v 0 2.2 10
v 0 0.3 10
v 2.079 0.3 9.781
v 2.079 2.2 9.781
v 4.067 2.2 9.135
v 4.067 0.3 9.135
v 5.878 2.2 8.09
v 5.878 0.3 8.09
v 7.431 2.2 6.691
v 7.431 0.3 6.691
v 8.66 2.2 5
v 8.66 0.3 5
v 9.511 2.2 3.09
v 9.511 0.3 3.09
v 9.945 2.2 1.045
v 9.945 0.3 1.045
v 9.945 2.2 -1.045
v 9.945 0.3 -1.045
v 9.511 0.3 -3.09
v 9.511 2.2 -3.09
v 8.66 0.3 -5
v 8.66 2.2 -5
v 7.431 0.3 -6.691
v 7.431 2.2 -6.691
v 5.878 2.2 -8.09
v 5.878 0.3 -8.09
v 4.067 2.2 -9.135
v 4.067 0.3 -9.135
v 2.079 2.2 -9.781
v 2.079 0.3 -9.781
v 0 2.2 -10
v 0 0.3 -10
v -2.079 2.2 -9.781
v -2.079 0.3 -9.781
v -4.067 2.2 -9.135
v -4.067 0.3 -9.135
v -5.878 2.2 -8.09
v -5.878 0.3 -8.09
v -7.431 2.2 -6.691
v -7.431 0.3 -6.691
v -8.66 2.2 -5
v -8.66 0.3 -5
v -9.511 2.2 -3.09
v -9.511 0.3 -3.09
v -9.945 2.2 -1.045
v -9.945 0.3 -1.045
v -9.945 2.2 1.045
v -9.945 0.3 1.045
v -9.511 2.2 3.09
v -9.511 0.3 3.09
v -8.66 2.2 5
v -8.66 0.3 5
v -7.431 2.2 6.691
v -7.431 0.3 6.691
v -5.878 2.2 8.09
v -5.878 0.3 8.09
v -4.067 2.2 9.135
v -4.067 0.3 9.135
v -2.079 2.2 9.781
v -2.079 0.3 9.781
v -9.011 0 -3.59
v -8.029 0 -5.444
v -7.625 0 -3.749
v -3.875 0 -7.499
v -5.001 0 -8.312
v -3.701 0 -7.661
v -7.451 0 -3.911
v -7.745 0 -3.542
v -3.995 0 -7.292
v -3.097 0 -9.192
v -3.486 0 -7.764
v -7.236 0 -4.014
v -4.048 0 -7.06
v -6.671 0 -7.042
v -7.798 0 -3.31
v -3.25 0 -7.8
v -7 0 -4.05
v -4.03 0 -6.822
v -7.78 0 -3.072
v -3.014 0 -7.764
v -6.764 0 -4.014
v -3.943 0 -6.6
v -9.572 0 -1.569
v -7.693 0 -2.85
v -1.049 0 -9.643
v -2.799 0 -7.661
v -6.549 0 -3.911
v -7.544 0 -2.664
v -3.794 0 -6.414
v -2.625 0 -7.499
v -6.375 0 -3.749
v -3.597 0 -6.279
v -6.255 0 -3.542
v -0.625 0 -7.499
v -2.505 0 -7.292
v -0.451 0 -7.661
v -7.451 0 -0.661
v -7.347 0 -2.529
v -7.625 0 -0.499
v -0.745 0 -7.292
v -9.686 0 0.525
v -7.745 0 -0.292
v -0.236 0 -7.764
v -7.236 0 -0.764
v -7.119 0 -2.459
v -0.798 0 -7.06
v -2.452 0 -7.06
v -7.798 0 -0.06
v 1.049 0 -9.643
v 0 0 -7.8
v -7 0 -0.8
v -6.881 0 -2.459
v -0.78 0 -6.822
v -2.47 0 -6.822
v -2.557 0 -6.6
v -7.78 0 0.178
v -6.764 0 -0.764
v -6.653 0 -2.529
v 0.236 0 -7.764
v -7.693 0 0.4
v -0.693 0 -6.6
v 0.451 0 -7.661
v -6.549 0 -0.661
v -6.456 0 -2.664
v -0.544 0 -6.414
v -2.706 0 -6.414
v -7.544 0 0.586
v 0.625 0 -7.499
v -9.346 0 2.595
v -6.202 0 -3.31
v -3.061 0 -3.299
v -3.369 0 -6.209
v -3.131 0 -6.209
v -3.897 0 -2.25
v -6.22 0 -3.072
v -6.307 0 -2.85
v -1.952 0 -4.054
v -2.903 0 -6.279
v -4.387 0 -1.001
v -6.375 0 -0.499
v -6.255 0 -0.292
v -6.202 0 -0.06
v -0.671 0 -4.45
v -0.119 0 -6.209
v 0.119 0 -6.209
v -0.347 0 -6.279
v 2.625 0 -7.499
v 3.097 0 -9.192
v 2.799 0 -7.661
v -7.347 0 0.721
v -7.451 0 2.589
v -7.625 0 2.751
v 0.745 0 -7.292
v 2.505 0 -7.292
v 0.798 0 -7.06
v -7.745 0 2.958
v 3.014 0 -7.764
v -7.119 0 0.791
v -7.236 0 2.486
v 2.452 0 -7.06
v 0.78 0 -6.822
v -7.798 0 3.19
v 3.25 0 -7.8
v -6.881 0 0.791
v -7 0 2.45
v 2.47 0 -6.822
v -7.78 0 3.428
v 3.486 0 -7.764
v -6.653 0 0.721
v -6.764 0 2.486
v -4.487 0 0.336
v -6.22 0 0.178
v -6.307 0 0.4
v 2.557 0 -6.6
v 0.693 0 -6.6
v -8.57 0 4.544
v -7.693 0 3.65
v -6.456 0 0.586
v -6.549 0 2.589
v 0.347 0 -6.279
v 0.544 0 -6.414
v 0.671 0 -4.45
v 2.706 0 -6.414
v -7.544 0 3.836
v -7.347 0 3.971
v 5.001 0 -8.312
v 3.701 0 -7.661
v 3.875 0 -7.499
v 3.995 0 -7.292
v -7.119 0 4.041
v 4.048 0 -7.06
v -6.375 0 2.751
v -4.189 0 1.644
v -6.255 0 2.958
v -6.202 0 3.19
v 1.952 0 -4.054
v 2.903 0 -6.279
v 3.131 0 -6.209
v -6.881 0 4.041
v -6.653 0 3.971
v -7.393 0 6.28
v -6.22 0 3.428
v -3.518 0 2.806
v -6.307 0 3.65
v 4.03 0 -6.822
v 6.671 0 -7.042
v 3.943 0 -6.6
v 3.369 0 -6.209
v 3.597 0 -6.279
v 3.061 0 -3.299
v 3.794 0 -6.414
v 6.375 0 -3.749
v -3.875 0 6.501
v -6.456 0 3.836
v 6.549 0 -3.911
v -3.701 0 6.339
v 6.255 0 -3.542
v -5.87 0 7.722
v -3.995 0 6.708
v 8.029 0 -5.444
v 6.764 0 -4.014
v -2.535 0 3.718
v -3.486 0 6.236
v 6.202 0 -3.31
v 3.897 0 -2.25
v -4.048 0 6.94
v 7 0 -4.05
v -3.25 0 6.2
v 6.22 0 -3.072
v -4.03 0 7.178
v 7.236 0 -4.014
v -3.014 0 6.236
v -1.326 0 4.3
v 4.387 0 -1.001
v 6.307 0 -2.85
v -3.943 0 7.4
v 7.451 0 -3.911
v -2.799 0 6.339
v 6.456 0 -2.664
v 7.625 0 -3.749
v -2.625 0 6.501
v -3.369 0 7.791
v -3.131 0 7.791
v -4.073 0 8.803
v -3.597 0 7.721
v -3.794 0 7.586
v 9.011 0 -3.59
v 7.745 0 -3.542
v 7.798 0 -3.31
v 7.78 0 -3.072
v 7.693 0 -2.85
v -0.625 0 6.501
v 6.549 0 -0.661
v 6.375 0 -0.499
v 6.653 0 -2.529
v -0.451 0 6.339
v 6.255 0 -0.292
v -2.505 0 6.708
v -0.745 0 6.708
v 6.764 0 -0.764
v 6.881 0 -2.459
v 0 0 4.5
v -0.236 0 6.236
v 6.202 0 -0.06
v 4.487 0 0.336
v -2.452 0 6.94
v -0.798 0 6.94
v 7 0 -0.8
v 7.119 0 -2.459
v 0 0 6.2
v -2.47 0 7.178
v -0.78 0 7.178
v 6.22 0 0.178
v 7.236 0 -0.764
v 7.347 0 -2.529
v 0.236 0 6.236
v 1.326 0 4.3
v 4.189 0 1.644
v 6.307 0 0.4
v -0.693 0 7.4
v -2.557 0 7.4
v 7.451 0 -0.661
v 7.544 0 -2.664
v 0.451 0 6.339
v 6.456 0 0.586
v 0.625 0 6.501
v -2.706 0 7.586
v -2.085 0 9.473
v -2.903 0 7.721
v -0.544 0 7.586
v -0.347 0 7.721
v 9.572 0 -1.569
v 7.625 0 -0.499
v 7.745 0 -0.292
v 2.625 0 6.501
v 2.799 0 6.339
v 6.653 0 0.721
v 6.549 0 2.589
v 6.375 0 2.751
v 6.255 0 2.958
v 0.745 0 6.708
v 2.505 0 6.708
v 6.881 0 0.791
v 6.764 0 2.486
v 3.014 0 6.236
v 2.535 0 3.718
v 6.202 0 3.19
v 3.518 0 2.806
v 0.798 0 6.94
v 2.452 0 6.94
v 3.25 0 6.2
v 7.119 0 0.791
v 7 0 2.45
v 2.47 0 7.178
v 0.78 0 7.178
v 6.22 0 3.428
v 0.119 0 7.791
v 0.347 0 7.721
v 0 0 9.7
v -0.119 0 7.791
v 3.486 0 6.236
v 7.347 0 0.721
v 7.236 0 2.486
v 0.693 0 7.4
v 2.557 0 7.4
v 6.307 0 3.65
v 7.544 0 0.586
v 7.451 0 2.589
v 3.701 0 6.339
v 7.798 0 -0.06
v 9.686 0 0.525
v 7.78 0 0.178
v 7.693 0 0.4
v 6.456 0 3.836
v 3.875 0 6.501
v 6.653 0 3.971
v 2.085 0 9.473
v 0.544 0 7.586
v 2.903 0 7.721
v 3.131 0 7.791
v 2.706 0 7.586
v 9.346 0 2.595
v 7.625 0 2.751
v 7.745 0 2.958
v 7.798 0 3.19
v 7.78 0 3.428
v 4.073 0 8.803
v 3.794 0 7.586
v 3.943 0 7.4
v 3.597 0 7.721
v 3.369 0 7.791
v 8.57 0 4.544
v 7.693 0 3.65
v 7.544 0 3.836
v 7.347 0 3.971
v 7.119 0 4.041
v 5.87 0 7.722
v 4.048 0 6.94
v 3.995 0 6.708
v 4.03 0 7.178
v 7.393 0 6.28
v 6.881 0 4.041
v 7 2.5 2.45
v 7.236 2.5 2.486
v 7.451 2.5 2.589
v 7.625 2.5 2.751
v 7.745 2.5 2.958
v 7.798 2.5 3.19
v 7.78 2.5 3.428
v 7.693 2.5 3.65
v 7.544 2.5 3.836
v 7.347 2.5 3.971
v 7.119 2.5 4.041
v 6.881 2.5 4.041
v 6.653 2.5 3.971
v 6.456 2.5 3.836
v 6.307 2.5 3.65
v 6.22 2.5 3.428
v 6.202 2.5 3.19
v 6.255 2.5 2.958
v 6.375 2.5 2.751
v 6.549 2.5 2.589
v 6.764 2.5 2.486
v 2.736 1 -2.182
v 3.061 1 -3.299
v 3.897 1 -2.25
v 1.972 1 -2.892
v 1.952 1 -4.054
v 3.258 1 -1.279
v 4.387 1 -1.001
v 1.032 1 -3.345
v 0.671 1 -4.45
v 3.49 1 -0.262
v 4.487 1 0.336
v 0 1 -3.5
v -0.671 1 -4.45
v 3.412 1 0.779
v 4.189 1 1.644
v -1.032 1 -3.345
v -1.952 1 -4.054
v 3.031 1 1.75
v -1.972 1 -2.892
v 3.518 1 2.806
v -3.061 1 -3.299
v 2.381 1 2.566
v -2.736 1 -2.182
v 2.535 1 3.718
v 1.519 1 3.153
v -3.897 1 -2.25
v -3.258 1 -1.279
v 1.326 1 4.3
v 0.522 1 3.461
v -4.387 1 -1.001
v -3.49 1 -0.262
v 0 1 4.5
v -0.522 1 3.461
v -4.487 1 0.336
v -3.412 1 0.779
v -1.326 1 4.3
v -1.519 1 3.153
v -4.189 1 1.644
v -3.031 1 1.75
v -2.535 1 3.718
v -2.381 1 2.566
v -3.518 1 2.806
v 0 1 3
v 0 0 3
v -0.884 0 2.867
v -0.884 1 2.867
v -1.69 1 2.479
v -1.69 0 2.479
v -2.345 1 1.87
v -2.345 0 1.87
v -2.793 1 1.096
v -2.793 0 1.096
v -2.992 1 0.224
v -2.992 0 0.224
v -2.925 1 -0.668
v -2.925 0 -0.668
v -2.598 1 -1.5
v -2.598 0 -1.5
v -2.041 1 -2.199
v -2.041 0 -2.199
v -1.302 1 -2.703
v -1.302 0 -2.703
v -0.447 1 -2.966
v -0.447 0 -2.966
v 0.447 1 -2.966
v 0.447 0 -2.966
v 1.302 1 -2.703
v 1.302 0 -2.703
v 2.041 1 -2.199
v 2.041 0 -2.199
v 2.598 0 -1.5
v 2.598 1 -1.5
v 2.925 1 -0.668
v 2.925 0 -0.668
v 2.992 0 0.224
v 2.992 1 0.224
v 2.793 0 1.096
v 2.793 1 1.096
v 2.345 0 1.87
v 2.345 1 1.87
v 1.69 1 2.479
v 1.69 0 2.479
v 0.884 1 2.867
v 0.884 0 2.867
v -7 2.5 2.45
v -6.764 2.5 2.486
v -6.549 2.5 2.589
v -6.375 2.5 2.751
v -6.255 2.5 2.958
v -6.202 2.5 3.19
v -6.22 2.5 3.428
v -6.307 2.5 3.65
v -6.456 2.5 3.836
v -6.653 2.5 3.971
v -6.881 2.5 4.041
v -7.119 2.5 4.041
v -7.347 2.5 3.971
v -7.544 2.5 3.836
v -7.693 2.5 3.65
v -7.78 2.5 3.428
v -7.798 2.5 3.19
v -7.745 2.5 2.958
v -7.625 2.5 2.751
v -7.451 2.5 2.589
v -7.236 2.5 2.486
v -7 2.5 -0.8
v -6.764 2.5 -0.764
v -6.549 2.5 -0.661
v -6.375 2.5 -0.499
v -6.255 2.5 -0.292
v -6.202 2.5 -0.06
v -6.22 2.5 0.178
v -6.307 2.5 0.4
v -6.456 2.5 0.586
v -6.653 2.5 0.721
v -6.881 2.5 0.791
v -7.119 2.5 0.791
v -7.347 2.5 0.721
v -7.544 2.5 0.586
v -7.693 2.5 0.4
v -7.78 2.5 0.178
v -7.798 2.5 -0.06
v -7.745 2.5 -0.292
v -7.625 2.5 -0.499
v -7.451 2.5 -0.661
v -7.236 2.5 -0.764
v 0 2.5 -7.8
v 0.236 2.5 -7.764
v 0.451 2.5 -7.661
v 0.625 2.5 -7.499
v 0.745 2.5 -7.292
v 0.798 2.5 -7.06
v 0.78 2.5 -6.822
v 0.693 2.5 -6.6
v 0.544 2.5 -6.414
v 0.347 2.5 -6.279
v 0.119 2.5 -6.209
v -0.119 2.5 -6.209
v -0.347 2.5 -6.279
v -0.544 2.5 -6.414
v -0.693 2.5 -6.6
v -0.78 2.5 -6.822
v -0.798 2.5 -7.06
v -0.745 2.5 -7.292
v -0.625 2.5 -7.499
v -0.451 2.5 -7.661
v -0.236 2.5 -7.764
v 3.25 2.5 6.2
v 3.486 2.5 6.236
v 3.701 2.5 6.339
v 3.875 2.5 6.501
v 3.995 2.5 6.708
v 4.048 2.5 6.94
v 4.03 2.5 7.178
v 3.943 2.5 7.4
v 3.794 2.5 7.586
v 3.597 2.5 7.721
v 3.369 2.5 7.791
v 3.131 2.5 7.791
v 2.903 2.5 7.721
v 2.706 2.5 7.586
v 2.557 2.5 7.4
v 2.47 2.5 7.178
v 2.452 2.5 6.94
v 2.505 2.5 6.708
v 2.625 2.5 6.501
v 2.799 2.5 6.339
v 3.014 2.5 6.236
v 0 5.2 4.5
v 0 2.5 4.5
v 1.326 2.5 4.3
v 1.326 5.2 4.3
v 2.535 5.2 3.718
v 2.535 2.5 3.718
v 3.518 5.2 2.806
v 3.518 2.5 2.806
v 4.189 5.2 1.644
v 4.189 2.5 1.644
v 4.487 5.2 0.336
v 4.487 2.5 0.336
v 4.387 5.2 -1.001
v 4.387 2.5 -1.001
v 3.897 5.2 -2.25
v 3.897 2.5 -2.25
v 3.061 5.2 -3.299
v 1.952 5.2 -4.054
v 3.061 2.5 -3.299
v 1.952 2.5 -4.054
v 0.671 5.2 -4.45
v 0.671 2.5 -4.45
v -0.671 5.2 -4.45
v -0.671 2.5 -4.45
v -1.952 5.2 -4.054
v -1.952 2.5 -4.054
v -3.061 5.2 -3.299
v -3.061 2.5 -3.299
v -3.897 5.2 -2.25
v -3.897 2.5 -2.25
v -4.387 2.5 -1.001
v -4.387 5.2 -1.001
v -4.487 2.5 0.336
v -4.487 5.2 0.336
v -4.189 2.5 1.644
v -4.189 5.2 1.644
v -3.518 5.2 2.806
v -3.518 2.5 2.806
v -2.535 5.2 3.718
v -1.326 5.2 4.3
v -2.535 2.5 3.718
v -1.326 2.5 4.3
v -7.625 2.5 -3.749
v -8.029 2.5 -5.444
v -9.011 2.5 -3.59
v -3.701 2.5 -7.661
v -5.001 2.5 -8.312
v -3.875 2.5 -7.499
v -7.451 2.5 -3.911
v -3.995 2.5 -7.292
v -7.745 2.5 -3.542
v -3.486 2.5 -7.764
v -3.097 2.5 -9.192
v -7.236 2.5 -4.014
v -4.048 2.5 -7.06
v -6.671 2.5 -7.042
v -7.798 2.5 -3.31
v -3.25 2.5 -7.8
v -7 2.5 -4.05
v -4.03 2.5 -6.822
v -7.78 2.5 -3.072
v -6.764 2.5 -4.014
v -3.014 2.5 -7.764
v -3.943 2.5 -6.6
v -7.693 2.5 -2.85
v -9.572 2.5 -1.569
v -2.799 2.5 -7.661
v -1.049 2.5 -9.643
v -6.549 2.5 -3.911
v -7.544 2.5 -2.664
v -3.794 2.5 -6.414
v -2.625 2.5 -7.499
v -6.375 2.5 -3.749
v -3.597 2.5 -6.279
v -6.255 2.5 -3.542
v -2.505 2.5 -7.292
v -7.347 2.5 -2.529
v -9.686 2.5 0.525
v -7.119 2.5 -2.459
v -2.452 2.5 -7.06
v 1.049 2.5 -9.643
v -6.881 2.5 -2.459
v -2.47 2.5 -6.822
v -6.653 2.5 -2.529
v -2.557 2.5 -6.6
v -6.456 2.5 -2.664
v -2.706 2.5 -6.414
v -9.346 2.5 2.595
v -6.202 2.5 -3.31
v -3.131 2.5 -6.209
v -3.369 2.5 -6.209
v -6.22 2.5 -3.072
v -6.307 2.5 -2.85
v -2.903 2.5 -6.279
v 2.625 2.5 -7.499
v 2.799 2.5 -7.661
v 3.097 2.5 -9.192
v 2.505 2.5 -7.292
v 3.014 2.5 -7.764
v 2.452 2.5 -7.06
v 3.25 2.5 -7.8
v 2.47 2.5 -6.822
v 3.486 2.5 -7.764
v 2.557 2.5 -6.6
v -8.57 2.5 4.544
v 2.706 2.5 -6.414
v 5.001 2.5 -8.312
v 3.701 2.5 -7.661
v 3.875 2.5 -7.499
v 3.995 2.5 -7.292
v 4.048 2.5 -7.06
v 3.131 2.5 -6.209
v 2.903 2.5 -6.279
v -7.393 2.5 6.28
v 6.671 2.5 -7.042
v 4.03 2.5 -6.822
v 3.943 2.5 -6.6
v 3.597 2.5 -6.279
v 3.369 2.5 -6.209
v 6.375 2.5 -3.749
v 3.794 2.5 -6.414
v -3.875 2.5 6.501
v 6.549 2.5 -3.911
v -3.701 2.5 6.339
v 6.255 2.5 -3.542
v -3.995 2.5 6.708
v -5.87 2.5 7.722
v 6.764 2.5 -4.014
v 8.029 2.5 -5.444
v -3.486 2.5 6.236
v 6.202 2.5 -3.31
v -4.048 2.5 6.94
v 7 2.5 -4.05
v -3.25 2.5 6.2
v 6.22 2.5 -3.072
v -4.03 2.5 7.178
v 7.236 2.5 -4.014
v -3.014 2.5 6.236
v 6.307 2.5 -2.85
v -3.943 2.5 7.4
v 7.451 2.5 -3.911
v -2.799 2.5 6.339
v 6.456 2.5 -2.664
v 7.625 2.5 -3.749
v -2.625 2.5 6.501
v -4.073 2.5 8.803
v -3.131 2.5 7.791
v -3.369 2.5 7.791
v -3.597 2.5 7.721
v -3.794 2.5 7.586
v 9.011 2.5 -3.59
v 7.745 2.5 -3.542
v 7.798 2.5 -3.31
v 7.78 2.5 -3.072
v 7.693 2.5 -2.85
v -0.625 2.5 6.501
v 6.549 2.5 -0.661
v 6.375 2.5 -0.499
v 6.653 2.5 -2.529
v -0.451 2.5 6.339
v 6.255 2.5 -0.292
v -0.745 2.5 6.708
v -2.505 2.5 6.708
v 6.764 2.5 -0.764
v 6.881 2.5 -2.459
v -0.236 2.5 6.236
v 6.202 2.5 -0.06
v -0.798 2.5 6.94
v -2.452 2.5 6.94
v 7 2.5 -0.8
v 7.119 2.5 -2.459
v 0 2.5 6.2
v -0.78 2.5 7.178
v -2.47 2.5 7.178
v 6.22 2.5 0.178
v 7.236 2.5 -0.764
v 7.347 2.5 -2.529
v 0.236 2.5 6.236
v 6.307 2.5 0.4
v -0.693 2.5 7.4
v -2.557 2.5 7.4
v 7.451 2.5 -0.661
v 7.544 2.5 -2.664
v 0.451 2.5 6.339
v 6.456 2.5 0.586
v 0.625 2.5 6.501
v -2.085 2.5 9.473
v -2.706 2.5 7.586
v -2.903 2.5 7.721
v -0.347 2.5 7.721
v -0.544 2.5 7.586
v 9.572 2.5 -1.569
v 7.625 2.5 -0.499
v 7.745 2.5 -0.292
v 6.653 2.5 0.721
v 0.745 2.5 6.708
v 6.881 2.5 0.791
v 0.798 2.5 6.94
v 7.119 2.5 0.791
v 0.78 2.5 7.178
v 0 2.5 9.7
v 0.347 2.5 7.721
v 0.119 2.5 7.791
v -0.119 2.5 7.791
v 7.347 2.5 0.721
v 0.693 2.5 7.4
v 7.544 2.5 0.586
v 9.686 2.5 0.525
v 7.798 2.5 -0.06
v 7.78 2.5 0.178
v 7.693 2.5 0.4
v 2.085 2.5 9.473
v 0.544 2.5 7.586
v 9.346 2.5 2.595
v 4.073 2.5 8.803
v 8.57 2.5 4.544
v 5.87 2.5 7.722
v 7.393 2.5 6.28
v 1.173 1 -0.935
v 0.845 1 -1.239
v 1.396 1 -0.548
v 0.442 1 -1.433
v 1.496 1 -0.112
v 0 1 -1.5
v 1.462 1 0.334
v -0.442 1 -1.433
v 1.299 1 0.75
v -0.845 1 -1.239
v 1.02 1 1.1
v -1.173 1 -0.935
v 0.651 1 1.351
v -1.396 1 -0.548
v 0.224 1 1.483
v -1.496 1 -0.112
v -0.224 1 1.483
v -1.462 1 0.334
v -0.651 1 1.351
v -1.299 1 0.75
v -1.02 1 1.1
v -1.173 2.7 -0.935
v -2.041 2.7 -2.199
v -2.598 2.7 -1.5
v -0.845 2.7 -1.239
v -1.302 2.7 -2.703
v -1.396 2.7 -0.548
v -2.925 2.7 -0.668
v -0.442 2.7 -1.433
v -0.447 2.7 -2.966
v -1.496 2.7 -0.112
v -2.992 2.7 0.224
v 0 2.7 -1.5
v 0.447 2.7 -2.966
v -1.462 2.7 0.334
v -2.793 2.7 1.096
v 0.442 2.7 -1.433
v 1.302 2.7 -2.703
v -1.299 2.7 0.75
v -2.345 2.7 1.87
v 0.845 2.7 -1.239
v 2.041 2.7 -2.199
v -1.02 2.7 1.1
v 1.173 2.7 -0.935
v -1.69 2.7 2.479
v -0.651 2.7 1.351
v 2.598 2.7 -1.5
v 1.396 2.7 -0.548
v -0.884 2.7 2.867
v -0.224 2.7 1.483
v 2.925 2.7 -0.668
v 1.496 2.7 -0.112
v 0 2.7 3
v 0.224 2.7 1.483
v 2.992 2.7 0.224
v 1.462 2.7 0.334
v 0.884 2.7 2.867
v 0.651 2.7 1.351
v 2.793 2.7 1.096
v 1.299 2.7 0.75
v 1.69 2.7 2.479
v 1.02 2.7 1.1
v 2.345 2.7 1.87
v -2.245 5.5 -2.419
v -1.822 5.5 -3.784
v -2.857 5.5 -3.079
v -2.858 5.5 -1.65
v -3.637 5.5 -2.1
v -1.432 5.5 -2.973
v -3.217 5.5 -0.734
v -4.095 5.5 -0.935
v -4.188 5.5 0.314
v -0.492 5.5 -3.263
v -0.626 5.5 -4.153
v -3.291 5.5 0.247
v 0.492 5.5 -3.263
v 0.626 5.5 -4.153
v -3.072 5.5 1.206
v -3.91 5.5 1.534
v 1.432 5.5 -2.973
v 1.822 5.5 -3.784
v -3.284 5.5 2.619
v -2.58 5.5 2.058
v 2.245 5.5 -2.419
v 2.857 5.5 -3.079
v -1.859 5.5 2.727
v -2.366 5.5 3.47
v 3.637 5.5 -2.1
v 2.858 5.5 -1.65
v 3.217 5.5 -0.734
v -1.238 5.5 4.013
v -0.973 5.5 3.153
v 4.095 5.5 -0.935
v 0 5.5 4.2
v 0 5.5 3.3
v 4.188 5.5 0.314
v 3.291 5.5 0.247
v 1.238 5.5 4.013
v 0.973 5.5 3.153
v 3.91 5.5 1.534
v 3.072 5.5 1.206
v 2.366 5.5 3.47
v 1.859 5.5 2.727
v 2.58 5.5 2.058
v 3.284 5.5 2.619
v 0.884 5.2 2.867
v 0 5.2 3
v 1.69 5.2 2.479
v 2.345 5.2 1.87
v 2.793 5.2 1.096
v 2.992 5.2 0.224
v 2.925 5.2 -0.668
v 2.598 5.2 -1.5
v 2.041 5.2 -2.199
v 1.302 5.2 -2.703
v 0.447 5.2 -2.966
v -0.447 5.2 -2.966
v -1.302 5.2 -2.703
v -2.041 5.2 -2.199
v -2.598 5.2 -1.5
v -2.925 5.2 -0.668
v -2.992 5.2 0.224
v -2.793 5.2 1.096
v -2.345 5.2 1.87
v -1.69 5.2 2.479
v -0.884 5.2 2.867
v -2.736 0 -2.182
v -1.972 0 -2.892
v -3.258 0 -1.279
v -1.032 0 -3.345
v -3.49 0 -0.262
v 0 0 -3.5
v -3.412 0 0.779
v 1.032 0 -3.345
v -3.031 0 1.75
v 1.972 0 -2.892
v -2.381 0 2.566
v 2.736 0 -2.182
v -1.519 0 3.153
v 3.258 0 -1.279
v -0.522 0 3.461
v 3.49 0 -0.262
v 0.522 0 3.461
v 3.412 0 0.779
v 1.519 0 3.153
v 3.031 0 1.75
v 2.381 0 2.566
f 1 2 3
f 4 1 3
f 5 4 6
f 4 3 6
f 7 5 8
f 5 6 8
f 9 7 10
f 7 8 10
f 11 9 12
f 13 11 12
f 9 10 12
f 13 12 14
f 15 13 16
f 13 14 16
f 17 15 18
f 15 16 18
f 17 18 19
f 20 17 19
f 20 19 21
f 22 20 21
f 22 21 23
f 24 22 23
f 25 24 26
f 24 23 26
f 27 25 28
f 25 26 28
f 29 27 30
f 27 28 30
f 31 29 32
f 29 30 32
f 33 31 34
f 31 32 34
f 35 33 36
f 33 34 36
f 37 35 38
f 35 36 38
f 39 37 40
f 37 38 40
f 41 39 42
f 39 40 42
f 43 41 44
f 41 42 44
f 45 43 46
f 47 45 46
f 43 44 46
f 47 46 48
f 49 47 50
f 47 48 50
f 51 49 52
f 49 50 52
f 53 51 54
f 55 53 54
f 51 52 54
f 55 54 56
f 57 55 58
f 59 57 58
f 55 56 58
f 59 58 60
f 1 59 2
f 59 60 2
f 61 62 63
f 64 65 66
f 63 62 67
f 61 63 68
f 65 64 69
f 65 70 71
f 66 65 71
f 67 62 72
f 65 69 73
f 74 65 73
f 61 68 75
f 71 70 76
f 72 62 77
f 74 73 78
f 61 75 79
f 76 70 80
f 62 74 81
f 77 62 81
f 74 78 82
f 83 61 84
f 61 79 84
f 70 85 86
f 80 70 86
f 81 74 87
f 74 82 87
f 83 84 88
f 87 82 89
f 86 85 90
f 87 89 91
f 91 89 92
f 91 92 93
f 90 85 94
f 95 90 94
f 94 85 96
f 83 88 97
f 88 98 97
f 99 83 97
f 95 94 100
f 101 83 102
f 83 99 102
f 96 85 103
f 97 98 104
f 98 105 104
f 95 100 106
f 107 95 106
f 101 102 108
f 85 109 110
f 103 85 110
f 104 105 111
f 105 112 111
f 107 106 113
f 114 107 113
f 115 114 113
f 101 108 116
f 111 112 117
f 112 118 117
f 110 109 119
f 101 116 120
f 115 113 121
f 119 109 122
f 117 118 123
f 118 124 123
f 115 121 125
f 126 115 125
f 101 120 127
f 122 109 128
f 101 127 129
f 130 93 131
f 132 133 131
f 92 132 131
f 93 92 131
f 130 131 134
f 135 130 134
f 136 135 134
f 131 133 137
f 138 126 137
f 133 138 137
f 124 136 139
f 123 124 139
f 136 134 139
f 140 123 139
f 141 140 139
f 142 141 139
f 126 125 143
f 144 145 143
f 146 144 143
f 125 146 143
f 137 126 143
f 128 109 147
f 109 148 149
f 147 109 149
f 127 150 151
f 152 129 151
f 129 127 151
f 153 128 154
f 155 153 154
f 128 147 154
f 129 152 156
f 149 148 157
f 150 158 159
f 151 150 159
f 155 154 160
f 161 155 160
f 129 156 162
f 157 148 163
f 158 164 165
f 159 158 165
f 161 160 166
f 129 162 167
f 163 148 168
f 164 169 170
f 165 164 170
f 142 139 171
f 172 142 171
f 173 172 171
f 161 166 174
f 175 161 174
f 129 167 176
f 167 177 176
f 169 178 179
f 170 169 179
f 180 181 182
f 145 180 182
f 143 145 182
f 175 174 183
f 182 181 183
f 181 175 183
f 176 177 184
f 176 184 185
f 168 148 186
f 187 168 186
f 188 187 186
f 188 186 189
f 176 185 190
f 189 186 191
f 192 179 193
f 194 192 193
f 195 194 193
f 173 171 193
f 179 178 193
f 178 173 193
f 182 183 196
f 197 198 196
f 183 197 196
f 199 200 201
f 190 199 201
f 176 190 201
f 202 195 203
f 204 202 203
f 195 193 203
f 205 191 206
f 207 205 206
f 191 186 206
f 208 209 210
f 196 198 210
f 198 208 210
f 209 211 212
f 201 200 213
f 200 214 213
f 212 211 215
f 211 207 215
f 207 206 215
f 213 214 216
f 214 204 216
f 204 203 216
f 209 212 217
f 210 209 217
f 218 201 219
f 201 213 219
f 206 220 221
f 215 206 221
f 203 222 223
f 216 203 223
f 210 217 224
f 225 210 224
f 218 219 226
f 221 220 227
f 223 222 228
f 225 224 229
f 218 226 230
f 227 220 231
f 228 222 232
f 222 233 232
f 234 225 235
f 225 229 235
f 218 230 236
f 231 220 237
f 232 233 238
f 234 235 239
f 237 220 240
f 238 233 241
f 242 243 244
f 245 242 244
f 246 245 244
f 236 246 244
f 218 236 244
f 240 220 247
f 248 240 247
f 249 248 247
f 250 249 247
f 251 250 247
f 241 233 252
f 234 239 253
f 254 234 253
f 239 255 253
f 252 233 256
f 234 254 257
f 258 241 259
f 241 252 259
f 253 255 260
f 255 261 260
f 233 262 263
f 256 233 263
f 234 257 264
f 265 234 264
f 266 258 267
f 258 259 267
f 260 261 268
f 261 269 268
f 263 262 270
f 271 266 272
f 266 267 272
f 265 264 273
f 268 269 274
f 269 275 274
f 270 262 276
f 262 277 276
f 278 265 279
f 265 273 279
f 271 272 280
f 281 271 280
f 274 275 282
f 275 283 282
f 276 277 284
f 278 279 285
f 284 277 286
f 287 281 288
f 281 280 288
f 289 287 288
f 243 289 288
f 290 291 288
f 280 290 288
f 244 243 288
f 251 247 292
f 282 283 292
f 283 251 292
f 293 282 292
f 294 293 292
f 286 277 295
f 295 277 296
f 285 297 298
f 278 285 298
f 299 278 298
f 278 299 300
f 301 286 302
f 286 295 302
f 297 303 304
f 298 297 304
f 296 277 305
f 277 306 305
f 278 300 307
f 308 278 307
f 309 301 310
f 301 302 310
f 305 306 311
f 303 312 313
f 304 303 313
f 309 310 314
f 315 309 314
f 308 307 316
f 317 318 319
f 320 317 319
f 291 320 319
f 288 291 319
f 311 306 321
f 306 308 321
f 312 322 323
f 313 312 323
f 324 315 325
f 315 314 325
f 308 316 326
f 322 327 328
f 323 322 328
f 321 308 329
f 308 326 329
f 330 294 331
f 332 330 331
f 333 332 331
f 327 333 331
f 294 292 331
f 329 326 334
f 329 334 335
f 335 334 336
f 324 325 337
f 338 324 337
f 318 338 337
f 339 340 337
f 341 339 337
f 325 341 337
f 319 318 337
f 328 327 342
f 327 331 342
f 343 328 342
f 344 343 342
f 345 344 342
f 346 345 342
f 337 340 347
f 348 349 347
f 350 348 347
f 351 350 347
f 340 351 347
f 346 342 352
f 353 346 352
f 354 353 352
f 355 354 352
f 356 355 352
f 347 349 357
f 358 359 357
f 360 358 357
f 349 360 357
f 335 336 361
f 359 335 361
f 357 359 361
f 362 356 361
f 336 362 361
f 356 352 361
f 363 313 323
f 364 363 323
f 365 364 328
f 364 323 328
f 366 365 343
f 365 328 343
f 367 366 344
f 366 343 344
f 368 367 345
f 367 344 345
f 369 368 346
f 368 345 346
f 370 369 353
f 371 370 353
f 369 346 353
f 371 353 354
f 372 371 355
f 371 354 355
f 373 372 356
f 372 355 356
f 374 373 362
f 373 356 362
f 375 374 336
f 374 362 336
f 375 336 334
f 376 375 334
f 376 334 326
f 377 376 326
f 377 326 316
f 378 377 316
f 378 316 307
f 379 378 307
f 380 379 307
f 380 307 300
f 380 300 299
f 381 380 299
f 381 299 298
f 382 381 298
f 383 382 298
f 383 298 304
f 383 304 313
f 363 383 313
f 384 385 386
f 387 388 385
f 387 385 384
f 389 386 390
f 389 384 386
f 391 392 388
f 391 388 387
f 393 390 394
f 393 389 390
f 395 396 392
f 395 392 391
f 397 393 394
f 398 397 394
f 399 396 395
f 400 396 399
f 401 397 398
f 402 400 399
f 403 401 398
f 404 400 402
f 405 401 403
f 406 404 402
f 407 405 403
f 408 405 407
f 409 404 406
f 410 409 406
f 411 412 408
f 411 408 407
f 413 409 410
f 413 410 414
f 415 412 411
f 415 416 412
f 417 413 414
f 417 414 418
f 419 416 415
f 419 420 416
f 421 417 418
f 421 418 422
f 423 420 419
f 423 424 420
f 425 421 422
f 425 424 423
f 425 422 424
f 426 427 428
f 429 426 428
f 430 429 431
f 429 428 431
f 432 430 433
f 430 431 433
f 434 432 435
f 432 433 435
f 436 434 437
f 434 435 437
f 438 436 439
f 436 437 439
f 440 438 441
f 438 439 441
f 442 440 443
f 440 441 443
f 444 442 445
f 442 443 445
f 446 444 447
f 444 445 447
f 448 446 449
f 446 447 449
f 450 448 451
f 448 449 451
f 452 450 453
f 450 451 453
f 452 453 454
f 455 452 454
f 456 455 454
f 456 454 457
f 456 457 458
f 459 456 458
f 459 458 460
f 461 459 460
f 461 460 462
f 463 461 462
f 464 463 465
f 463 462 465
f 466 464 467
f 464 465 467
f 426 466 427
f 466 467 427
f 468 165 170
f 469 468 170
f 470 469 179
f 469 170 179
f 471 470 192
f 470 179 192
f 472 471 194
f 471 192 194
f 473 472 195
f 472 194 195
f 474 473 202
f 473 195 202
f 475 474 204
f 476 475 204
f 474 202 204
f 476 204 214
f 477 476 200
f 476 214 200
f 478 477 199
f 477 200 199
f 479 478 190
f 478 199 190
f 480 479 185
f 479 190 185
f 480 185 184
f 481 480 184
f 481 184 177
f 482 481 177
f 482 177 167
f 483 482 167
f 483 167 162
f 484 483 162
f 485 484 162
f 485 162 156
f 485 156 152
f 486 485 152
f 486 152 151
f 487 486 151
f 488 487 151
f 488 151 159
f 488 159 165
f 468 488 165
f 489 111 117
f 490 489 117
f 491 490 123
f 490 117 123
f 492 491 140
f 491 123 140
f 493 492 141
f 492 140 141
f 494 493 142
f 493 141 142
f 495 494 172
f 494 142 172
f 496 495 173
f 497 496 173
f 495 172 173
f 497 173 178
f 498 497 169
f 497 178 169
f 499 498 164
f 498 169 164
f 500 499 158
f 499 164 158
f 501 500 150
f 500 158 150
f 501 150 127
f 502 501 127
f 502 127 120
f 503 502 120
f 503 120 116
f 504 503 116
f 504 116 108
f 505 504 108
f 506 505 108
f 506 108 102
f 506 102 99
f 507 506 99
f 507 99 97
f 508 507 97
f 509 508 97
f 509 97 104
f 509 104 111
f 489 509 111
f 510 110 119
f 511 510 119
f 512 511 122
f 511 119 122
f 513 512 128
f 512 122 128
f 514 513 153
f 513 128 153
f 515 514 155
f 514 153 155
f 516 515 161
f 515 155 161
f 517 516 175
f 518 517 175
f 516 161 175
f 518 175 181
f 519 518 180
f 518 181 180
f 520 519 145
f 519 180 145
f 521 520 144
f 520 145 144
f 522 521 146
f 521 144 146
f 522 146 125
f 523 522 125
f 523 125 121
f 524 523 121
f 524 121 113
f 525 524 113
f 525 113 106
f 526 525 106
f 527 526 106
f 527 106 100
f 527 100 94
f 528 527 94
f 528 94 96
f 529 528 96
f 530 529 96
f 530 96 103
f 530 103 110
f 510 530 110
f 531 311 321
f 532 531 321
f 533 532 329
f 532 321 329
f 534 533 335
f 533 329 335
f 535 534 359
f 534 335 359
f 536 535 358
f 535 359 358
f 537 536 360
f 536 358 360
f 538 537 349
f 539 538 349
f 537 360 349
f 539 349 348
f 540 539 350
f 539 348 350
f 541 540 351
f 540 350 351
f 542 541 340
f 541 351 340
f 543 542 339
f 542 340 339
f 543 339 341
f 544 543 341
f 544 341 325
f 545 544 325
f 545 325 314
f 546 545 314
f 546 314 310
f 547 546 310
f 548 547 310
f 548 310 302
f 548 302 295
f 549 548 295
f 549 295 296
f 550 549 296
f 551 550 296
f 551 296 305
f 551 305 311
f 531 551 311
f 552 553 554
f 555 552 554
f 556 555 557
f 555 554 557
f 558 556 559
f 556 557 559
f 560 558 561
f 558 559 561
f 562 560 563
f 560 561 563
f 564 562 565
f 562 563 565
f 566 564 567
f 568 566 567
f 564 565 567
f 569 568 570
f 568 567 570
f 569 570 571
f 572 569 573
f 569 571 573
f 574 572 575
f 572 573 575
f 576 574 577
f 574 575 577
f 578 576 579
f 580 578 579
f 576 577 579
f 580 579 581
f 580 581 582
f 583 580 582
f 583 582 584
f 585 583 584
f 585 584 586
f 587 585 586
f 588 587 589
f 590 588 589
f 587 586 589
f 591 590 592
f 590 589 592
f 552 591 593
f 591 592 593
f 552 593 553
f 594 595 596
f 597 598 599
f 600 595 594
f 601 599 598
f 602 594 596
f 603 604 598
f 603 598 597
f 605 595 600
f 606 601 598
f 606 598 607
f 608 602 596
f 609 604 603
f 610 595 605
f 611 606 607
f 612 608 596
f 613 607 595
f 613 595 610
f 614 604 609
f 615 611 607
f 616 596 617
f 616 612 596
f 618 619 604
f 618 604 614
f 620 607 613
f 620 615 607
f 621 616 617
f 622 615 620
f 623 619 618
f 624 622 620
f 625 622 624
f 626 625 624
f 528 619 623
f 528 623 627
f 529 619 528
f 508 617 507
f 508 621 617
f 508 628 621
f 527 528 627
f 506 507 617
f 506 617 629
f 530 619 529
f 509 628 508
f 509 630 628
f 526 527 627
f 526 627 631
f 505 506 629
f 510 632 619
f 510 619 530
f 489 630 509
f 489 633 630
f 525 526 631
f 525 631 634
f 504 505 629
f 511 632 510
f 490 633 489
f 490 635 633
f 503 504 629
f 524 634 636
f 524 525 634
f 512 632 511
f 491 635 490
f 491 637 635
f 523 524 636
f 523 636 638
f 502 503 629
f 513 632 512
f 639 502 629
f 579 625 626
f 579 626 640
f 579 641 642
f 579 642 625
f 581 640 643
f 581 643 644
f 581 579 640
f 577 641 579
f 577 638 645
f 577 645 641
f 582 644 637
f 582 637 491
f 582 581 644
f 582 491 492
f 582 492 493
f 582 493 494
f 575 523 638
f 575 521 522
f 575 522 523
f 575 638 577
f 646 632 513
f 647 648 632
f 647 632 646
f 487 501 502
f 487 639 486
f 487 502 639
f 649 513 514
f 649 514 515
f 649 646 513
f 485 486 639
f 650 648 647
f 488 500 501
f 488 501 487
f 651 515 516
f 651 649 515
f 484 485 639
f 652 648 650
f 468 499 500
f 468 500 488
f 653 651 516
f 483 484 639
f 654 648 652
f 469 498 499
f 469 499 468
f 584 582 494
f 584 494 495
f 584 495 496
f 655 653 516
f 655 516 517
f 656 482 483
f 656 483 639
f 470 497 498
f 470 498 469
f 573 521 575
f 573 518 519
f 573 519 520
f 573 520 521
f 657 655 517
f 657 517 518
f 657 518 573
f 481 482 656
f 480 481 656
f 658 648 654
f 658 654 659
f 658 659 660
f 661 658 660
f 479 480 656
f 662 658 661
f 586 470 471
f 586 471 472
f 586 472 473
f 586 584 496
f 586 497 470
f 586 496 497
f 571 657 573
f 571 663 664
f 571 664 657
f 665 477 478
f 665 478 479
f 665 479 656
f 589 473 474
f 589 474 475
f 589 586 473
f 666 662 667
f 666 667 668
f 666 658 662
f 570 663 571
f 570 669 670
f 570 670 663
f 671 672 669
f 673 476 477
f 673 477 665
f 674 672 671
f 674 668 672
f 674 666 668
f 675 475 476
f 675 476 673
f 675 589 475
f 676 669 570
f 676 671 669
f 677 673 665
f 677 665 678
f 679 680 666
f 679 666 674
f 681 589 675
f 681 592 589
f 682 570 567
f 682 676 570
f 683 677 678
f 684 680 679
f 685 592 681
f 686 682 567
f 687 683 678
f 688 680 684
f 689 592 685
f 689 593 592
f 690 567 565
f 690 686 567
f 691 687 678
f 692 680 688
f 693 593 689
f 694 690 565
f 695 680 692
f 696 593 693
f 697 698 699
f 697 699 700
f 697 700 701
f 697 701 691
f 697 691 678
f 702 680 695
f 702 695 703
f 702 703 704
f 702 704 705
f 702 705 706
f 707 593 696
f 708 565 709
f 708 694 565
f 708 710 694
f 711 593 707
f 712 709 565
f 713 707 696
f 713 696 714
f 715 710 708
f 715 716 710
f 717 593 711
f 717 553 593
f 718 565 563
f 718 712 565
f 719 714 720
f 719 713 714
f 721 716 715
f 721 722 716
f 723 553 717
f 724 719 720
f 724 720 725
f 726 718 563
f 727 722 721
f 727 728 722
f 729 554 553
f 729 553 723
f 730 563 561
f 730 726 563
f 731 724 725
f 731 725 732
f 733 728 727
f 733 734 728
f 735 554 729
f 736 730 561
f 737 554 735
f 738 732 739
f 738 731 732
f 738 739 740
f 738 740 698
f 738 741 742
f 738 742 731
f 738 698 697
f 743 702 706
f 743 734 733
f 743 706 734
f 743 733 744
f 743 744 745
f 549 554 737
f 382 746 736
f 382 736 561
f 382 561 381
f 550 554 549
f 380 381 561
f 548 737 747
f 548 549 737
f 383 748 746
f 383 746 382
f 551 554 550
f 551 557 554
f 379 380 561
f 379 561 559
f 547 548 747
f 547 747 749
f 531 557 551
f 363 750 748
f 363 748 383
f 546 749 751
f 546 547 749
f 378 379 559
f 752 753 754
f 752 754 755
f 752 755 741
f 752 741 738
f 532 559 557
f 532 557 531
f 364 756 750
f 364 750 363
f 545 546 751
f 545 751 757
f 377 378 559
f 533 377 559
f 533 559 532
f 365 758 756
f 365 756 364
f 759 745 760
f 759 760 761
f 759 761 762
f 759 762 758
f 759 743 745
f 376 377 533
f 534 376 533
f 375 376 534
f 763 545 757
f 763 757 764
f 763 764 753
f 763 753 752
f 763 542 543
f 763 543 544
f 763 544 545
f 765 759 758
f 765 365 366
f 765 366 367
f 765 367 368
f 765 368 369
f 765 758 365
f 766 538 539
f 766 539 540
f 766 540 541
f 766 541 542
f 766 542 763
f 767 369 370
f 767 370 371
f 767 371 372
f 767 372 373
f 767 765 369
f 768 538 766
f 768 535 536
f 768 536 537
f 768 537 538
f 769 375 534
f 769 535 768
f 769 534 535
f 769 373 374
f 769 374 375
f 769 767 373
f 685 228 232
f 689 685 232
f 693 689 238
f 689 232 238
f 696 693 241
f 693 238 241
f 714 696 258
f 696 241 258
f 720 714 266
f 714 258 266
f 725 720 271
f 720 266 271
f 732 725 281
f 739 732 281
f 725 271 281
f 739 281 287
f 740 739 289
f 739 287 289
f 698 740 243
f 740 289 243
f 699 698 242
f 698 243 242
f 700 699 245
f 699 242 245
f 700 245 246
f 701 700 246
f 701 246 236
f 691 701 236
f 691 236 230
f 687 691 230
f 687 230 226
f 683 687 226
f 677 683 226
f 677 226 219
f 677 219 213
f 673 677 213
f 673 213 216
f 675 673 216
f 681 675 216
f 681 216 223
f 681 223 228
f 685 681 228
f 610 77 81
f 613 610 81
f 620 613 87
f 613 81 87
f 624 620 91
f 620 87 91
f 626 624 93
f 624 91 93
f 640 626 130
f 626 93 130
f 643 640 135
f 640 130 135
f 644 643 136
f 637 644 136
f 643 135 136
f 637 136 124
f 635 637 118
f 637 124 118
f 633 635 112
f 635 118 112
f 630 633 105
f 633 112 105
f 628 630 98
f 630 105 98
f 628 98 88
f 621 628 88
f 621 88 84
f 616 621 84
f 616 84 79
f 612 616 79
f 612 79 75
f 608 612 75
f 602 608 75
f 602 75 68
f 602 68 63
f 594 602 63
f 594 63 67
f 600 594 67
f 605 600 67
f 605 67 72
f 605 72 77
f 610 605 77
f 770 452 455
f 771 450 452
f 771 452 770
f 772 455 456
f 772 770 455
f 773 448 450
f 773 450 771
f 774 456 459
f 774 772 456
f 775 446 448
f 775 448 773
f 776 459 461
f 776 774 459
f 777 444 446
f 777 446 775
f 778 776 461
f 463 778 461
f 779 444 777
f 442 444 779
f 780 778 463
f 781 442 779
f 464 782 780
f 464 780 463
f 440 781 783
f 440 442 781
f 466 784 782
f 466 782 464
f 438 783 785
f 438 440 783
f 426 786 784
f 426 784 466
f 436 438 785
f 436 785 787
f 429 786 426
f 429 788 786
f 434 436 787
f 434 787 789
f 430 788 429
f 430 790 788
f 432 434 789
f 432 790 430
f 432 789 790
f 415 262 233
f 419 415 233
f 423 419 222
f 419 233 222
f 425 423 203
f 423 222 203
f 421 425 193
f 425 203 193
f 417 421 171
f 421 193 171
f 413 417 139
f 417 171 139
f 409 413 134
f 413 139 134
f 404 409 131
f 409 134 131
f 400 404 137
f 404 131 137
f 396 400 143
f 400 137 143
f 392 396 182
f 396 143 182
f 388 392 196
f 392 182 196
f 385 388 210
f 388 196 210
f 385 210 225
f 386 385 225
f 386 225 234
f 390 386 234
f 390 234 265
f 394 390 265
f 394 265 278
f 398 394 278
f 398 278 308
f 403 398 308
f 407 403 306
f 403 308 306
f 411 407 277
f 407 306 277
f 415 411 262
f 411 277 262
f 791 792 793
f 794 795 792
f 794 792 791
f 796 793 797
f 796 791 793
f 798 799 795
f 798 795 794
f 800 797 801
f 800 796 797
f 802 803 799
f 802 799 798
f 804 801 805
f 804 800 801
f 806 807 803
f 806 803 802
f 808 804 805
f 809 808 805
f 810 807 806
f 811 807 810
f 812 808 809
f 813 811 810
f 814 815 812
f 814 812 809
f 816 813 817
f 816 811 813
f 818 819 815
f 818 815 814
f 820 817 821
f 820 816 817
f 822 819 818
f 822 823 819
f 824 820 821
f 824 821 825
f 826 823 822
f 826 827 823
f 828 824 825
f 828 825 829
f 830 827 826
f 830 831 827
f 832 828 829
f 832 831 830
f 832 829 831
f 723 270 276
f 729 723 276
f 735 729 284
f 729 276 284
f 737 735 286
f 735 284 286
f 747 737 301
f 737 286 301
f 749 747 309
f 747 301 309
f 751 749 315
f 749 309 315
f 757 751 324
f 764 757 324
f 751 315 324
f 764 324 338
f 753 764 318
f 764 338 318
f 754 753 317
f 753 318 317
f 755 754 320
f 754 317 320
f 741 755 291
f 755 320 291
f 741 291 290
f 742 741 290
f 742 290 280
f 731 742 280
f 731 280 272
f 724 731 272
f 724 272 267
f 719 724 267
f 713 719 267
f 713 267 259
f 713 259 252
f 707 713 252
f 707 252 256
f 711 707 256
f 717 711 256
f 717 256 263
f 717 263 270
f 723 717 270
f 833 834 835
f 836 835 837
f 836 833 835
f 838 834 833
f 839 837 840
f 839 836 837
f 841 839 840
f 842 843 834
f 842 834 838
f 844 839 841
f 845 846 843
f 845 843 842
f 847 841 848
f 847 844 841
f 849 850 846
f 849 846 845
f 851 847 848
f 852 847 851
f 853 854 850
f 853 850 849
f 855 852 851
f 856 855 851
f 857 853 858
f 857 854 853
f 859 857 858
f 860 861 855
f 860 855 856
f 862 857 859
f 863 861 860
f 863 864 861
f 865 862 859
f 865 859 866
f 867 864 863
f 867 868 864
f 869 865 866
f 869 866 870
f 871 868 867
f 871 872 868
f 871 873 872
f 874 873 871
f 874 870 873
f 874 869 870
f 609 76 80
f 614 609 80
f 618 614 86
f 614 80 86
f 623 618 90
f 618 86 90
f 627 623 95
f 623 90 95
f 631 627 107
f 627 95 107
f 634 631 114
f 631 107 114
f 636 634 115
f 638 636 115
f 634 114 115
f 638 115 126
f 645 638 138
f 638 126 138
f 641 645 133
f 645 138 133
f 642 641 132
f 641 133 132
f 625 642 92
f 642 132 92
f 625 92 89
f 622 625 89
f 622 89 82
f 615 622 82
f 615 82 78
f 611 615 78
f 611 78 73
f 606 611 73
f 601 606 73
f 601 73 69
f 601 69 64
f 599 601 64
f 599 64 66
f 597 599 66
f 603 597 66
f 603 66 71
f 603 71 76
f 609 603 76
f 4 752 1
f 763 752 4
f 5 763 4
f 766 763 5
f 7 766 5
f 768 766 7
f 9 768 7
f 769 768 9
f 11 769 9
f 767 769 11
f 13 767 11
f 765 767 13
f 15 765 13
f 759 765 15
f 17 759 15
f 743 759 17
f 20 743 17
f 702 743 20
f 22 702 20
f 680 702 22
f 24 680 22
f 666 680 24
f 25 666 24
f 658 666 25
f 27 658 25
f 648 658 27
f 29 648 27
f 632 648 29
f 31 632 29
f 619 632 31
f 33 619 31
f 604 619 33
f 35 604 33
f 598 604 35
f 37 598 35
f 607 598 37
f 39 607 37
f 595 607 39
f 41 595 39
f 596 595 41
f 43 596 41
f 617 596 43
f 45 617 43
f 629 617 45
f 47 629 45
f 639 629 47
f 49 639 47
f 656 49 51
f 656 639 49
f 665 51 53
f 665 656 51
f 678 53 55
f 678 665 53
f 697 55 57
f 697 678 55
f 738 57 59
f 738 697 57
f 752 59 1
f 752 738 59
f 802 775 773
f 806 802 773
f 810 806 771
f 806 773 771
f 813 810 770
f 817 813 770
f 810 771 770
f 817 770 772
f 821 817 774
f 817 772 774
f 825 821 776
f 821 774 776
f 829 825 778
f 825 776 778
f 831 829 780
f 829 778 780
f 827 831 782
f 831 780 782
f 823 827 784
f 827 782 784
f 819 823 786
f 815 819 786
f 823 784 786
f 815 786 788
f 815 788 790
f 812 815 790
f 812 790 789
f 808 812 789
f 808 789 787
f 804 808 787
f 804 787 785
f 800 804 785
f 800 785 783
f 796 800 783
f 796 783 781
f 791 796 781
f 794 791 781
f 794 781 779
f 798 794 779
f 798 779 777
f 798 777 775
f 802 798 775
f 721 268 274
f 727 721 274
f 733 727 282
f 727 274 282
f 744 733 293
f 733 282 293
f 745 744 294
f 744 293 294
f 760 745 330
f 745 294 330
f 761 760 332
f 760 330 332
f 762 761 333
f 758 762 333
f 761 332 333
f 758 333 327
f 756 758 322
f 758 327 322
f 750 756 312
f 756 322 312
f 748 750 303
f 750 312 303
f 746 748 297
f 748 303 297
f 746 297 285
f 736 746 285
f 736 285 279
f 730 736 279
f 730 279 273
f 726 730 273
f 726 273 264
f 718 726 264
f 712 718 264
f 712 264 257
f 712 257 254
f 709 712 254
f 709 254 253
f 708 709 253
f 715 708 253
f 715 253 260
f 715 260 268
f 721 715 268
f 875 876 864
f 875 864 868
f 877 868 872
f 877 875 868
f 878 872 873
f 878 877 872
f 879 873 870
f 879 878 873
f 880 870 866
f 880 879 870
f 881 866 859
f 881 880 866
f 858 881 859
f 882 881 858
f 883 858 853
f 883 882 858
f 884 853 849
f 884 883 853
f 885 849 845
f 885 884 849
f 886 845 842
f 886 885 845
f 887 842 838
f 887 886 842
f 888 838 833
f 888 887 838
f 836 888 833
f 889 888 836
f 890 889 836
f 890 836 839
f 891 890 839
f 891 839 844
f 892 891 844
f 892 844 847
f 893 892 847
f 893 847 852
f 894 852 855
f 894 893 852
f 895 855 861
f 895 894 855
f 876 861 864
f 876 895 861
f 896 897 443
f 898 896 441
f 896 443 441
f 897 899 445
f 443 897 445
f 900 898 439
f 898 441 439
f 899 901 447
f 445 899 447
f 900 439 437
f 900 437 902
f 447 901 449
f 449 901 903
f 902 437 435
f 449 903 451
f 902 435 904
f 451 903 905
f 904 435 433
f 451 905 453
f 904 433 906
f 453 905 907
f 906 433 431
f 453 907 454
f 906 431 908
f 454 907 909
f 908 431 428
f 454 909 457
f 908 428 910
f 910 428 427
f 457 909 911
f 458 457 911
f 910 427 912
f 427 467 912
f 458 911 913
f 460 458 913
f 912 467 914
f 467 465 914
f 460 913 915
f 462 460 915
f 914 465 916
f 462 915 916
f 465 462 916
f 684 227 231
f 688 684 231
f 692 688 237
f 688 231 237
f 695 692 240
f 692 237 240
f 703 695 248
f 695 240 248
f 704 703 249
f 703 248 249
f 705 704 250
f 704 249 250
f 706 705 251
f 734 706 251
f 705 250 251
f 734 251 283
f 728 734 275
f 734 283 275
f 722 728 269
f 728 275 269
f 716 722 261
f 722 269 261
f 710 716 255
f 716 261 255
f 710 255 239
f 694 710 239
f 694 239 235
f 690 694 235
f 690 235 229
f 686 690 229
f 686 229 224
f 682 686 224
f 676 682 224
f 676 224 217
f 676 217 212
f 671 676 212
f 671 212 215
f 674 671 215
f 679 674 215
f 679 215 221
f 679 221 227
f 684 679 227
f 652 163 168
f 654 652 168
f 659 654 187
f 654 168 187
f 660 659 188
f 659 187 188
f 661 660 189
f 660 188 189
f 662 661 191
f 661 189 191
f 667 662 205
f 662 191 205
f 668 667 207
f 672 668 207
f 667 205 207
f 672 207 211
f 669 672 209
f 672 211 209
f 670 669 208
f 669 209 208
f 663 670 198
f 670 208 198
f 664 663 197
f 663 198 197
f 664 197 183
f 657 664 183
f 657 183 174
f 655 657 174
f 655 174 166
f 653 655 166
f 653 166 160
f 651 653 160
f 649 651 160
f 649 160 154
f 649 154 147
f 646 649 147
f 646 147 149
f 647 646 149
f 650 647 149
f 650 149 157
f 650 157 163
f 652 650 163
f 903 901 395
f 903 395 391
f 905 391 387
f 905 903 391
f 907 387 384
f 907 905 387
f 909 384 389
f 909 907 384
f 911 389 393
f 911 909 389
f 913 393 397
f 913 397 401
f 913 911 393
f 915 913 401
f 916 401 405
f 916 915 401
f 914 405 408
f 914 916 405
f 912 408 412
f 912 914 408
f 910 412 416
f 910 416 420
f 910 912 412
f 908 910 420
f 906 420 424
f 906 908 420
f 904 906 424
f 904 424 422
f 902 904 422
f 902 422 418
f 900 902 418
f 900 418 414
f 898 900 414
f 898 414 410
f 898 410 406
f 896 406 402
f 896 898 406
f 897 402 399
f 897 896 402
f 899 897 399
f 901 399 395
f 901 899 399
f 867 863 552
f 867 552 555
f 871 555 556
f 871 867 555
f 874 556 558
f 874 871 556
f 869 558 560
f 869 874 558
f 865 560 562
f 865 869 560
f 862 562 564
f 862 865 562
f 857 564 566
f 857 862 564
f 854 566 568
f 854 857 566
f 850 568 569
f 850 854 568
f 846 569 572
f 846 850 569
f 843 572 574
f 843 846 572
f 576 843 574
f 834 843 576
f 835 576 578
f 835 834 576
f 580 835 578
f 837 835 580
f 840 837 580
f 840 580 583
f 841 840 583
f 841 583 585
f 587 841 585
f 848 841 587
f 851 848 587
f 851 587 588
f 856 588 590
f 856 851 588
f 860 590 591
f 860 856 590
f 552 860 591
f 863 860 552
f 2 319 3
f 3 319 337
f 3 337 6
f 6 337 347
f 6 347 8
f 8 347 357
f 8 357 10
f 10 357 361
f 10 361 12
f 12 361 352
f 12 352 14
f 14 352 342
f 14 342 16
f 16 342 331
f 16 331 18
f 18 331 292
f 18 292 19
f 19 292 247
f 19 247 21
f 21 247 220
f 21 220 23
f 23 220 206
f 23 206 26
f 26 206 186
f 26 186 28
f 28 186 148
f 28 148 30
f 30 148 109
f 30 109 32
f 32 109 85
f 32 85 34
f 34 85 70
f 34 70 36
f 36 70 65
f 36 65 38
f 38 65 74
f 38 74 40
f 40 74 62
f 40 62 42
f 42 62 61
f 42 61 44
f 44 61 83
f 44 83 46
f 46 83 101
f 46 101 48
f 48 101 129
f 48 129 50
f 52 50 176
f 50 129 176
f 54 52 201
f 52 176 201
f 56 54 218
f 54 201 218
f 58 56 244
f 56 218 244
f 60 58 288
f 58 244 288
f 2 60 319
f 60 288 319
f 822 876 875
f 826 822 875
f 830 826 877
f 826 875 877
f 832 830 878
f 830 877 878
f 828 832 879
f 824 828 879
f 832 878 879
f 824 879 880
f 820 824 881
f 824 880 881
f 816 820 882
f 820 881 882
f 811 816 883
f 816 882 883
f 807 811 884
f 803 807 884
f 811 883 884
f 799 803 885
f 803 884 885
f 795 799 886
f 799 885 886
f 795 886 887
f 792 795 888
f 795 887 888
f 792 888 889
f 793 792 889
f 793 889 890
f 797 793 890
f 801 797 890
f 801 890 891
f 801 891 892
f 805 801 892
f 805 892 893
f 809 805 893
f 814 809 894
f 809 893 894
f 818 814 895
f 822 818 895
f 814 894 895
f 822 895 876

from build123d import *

# Parameters (mm, degrees)
SKETCH_1_R          = 10
EXTRUDE_1_DEPTH     = 2.5
SKETCH_2_R          = 4.5
EXTRUDE_2_DEPTH     = 3
SKETCH_3_R          = 3
CUT_EXTRUDE_1_DEPTH = 2.8
SKETCH_4_R          = 0.8
SKETCH_4_R_2        = 1.5
CUT_EXTRUDE_2_DEPTH = 16.173990905
CHAMFER_1_SIZE      = 0.3
SKETCH_5_R          = 4.5
SKETCH_5_R_2        = 3.5
SKETCH_5_R_3        = 3
SKETCH_5_R_4        = 1.5
CUT_EXTRUDE_3_DEPTH = 1


with BuildPart() as part:
    # 草图1 → 凸台-拉伸1 (new body)
    with BuildSketch(Plane(origin=(0, 0, 0), x_dir=(1, 0, 0), z_dir=(0, 1, 0))):
        with Locations(Location((0, 0, 0), (0, 0, 270))):
            Circle(SKETCH_1_R)
    extrude(amount=EXTRUDE_1_DEPTH)

    # 草图2 → 凸台-拉伸2 (add)
    with BuildSketch(Plane(origin=(0, 2.5, 0), x_dir=(1, 0, 0), z_dir=(0, 1, 0))):
        with Locations(Location((0, 0, 0), (0, 0, 270))):
            Circle(SKETCH_2_R)
    extrude(amount=EXTRUDE_2_DEPTH)

    # 草图3 → 切除-拉伸1 (cut)
    with BuildSketch(Plane(origin=(0, 5.5, 0), x_dir=(1, 0, 0), z_dir=(0, 1, 0))):
        with Locations(Location((0, 0, 0), (0, 0, 270))):
            Circle(SKETCH_3_R)
    extrude(amount=-CUT_EXTRUDE_1_DEPTH, mode=Mode.SUBTRACT)

    # 草图4 → 切除-拉伸2 (cut, through all)
    with BuildSketch(Plane.XZ):
        with Locations(Location((0, 7, 0), (0, 0, 270))):
            Circle(SKETCH_4_R)
        with Locations(Location((0, 0, 0), (0, 0, 270))):
            Circle(SKETCH_4_R_2)
        with Locations(Location((-3.25, 7, 0), (0, 0, 270))):
            Circle(SKETCH_4_R)
        with Locations(Location((3.25, 7, 0), (0, 0, 270))):
            Circle(SKETCH_4_R)
        with Locations(Location((7, 0, 0), (0, 0, 270))):
            Circle(SKETCH_4_R)
        with Locations(Location((7, 3.25, 0), (0, 0, 270))):
            Circle(SKETCH_4_R)
        with Locations(Location((7, -3.25, 0), (0, 0, 270))):
            Circle(SKETCH_4_R)
        with Locations(Location((0, -7, 0), (0, 0, 270))):
            Circle(SKETCH_4_R)
        with Locations(Location((3.25, -7, 0), (0, 0, 270))):
            Circle(SKETCH_4_R)
        with Locations(Location((-3.25, -7, 0), (0, 0, 270))):
            Circle(SKETCH_4_R)
        with Locations(Location((-7, 0, 0), (0, 0, 270))):
            Circle(SKETCH_4_R)
        with Locations(Location((-7, -3.25, 0), (0, 0, 270))):
            Circle(SKETCH_4_R)
        with Locations(Location((-7, 3.25, 0), (0, 0, 270))):
            Circle(SKETCH_4_R)
    extrude(amount=-CUT_EXTRUDE_2_DEPTH, mode=Mode.SUBTRACT)

    # 倒角1
    chamfer_1_edges = [part.edges().sort_by_distance(p)[0] for p in [
        (0, 5.5, -3),
        (0, 0, -10),
        (0, 2.5, -10),
        (0, 5.5, -4.5),
    ]]
    chamfer(chamfer_1_edges, length=CHAMFER_1_SIZE)

    # 草图5 → 切除-拉伸3 (cut)
    # profile 1 of 2: a face of its own
    with BuildSketch(Plane.XZ):
        with Locations(Location((0, 0, 0), (0, 0, 90))):
            Circle(SKETCH_5_R)
        with Locations(Location((0, 0, 0), (0, 0, 270))):
            Circle(SKETCH_5_R_2, mode=Mode.SUBTRACT)
    # profile 2 of 2: a face of its own
    with BuildSketch(Plane.XZ):
        with Locations(Location((0, 0, 0), (0, 0, 90))):
            Circle(SKETCH_5_R_3)
        with Locations(Location((0, 0, 0), (0, 0, 270))):
            Circle(SKETCH_5_R_4, mode=Mode.SUBTRACT)
    extrude(amount=-CUT_EXTRUDE_3_DEPTH, mode=Mode.SUBTRACT)


solid = part.part
